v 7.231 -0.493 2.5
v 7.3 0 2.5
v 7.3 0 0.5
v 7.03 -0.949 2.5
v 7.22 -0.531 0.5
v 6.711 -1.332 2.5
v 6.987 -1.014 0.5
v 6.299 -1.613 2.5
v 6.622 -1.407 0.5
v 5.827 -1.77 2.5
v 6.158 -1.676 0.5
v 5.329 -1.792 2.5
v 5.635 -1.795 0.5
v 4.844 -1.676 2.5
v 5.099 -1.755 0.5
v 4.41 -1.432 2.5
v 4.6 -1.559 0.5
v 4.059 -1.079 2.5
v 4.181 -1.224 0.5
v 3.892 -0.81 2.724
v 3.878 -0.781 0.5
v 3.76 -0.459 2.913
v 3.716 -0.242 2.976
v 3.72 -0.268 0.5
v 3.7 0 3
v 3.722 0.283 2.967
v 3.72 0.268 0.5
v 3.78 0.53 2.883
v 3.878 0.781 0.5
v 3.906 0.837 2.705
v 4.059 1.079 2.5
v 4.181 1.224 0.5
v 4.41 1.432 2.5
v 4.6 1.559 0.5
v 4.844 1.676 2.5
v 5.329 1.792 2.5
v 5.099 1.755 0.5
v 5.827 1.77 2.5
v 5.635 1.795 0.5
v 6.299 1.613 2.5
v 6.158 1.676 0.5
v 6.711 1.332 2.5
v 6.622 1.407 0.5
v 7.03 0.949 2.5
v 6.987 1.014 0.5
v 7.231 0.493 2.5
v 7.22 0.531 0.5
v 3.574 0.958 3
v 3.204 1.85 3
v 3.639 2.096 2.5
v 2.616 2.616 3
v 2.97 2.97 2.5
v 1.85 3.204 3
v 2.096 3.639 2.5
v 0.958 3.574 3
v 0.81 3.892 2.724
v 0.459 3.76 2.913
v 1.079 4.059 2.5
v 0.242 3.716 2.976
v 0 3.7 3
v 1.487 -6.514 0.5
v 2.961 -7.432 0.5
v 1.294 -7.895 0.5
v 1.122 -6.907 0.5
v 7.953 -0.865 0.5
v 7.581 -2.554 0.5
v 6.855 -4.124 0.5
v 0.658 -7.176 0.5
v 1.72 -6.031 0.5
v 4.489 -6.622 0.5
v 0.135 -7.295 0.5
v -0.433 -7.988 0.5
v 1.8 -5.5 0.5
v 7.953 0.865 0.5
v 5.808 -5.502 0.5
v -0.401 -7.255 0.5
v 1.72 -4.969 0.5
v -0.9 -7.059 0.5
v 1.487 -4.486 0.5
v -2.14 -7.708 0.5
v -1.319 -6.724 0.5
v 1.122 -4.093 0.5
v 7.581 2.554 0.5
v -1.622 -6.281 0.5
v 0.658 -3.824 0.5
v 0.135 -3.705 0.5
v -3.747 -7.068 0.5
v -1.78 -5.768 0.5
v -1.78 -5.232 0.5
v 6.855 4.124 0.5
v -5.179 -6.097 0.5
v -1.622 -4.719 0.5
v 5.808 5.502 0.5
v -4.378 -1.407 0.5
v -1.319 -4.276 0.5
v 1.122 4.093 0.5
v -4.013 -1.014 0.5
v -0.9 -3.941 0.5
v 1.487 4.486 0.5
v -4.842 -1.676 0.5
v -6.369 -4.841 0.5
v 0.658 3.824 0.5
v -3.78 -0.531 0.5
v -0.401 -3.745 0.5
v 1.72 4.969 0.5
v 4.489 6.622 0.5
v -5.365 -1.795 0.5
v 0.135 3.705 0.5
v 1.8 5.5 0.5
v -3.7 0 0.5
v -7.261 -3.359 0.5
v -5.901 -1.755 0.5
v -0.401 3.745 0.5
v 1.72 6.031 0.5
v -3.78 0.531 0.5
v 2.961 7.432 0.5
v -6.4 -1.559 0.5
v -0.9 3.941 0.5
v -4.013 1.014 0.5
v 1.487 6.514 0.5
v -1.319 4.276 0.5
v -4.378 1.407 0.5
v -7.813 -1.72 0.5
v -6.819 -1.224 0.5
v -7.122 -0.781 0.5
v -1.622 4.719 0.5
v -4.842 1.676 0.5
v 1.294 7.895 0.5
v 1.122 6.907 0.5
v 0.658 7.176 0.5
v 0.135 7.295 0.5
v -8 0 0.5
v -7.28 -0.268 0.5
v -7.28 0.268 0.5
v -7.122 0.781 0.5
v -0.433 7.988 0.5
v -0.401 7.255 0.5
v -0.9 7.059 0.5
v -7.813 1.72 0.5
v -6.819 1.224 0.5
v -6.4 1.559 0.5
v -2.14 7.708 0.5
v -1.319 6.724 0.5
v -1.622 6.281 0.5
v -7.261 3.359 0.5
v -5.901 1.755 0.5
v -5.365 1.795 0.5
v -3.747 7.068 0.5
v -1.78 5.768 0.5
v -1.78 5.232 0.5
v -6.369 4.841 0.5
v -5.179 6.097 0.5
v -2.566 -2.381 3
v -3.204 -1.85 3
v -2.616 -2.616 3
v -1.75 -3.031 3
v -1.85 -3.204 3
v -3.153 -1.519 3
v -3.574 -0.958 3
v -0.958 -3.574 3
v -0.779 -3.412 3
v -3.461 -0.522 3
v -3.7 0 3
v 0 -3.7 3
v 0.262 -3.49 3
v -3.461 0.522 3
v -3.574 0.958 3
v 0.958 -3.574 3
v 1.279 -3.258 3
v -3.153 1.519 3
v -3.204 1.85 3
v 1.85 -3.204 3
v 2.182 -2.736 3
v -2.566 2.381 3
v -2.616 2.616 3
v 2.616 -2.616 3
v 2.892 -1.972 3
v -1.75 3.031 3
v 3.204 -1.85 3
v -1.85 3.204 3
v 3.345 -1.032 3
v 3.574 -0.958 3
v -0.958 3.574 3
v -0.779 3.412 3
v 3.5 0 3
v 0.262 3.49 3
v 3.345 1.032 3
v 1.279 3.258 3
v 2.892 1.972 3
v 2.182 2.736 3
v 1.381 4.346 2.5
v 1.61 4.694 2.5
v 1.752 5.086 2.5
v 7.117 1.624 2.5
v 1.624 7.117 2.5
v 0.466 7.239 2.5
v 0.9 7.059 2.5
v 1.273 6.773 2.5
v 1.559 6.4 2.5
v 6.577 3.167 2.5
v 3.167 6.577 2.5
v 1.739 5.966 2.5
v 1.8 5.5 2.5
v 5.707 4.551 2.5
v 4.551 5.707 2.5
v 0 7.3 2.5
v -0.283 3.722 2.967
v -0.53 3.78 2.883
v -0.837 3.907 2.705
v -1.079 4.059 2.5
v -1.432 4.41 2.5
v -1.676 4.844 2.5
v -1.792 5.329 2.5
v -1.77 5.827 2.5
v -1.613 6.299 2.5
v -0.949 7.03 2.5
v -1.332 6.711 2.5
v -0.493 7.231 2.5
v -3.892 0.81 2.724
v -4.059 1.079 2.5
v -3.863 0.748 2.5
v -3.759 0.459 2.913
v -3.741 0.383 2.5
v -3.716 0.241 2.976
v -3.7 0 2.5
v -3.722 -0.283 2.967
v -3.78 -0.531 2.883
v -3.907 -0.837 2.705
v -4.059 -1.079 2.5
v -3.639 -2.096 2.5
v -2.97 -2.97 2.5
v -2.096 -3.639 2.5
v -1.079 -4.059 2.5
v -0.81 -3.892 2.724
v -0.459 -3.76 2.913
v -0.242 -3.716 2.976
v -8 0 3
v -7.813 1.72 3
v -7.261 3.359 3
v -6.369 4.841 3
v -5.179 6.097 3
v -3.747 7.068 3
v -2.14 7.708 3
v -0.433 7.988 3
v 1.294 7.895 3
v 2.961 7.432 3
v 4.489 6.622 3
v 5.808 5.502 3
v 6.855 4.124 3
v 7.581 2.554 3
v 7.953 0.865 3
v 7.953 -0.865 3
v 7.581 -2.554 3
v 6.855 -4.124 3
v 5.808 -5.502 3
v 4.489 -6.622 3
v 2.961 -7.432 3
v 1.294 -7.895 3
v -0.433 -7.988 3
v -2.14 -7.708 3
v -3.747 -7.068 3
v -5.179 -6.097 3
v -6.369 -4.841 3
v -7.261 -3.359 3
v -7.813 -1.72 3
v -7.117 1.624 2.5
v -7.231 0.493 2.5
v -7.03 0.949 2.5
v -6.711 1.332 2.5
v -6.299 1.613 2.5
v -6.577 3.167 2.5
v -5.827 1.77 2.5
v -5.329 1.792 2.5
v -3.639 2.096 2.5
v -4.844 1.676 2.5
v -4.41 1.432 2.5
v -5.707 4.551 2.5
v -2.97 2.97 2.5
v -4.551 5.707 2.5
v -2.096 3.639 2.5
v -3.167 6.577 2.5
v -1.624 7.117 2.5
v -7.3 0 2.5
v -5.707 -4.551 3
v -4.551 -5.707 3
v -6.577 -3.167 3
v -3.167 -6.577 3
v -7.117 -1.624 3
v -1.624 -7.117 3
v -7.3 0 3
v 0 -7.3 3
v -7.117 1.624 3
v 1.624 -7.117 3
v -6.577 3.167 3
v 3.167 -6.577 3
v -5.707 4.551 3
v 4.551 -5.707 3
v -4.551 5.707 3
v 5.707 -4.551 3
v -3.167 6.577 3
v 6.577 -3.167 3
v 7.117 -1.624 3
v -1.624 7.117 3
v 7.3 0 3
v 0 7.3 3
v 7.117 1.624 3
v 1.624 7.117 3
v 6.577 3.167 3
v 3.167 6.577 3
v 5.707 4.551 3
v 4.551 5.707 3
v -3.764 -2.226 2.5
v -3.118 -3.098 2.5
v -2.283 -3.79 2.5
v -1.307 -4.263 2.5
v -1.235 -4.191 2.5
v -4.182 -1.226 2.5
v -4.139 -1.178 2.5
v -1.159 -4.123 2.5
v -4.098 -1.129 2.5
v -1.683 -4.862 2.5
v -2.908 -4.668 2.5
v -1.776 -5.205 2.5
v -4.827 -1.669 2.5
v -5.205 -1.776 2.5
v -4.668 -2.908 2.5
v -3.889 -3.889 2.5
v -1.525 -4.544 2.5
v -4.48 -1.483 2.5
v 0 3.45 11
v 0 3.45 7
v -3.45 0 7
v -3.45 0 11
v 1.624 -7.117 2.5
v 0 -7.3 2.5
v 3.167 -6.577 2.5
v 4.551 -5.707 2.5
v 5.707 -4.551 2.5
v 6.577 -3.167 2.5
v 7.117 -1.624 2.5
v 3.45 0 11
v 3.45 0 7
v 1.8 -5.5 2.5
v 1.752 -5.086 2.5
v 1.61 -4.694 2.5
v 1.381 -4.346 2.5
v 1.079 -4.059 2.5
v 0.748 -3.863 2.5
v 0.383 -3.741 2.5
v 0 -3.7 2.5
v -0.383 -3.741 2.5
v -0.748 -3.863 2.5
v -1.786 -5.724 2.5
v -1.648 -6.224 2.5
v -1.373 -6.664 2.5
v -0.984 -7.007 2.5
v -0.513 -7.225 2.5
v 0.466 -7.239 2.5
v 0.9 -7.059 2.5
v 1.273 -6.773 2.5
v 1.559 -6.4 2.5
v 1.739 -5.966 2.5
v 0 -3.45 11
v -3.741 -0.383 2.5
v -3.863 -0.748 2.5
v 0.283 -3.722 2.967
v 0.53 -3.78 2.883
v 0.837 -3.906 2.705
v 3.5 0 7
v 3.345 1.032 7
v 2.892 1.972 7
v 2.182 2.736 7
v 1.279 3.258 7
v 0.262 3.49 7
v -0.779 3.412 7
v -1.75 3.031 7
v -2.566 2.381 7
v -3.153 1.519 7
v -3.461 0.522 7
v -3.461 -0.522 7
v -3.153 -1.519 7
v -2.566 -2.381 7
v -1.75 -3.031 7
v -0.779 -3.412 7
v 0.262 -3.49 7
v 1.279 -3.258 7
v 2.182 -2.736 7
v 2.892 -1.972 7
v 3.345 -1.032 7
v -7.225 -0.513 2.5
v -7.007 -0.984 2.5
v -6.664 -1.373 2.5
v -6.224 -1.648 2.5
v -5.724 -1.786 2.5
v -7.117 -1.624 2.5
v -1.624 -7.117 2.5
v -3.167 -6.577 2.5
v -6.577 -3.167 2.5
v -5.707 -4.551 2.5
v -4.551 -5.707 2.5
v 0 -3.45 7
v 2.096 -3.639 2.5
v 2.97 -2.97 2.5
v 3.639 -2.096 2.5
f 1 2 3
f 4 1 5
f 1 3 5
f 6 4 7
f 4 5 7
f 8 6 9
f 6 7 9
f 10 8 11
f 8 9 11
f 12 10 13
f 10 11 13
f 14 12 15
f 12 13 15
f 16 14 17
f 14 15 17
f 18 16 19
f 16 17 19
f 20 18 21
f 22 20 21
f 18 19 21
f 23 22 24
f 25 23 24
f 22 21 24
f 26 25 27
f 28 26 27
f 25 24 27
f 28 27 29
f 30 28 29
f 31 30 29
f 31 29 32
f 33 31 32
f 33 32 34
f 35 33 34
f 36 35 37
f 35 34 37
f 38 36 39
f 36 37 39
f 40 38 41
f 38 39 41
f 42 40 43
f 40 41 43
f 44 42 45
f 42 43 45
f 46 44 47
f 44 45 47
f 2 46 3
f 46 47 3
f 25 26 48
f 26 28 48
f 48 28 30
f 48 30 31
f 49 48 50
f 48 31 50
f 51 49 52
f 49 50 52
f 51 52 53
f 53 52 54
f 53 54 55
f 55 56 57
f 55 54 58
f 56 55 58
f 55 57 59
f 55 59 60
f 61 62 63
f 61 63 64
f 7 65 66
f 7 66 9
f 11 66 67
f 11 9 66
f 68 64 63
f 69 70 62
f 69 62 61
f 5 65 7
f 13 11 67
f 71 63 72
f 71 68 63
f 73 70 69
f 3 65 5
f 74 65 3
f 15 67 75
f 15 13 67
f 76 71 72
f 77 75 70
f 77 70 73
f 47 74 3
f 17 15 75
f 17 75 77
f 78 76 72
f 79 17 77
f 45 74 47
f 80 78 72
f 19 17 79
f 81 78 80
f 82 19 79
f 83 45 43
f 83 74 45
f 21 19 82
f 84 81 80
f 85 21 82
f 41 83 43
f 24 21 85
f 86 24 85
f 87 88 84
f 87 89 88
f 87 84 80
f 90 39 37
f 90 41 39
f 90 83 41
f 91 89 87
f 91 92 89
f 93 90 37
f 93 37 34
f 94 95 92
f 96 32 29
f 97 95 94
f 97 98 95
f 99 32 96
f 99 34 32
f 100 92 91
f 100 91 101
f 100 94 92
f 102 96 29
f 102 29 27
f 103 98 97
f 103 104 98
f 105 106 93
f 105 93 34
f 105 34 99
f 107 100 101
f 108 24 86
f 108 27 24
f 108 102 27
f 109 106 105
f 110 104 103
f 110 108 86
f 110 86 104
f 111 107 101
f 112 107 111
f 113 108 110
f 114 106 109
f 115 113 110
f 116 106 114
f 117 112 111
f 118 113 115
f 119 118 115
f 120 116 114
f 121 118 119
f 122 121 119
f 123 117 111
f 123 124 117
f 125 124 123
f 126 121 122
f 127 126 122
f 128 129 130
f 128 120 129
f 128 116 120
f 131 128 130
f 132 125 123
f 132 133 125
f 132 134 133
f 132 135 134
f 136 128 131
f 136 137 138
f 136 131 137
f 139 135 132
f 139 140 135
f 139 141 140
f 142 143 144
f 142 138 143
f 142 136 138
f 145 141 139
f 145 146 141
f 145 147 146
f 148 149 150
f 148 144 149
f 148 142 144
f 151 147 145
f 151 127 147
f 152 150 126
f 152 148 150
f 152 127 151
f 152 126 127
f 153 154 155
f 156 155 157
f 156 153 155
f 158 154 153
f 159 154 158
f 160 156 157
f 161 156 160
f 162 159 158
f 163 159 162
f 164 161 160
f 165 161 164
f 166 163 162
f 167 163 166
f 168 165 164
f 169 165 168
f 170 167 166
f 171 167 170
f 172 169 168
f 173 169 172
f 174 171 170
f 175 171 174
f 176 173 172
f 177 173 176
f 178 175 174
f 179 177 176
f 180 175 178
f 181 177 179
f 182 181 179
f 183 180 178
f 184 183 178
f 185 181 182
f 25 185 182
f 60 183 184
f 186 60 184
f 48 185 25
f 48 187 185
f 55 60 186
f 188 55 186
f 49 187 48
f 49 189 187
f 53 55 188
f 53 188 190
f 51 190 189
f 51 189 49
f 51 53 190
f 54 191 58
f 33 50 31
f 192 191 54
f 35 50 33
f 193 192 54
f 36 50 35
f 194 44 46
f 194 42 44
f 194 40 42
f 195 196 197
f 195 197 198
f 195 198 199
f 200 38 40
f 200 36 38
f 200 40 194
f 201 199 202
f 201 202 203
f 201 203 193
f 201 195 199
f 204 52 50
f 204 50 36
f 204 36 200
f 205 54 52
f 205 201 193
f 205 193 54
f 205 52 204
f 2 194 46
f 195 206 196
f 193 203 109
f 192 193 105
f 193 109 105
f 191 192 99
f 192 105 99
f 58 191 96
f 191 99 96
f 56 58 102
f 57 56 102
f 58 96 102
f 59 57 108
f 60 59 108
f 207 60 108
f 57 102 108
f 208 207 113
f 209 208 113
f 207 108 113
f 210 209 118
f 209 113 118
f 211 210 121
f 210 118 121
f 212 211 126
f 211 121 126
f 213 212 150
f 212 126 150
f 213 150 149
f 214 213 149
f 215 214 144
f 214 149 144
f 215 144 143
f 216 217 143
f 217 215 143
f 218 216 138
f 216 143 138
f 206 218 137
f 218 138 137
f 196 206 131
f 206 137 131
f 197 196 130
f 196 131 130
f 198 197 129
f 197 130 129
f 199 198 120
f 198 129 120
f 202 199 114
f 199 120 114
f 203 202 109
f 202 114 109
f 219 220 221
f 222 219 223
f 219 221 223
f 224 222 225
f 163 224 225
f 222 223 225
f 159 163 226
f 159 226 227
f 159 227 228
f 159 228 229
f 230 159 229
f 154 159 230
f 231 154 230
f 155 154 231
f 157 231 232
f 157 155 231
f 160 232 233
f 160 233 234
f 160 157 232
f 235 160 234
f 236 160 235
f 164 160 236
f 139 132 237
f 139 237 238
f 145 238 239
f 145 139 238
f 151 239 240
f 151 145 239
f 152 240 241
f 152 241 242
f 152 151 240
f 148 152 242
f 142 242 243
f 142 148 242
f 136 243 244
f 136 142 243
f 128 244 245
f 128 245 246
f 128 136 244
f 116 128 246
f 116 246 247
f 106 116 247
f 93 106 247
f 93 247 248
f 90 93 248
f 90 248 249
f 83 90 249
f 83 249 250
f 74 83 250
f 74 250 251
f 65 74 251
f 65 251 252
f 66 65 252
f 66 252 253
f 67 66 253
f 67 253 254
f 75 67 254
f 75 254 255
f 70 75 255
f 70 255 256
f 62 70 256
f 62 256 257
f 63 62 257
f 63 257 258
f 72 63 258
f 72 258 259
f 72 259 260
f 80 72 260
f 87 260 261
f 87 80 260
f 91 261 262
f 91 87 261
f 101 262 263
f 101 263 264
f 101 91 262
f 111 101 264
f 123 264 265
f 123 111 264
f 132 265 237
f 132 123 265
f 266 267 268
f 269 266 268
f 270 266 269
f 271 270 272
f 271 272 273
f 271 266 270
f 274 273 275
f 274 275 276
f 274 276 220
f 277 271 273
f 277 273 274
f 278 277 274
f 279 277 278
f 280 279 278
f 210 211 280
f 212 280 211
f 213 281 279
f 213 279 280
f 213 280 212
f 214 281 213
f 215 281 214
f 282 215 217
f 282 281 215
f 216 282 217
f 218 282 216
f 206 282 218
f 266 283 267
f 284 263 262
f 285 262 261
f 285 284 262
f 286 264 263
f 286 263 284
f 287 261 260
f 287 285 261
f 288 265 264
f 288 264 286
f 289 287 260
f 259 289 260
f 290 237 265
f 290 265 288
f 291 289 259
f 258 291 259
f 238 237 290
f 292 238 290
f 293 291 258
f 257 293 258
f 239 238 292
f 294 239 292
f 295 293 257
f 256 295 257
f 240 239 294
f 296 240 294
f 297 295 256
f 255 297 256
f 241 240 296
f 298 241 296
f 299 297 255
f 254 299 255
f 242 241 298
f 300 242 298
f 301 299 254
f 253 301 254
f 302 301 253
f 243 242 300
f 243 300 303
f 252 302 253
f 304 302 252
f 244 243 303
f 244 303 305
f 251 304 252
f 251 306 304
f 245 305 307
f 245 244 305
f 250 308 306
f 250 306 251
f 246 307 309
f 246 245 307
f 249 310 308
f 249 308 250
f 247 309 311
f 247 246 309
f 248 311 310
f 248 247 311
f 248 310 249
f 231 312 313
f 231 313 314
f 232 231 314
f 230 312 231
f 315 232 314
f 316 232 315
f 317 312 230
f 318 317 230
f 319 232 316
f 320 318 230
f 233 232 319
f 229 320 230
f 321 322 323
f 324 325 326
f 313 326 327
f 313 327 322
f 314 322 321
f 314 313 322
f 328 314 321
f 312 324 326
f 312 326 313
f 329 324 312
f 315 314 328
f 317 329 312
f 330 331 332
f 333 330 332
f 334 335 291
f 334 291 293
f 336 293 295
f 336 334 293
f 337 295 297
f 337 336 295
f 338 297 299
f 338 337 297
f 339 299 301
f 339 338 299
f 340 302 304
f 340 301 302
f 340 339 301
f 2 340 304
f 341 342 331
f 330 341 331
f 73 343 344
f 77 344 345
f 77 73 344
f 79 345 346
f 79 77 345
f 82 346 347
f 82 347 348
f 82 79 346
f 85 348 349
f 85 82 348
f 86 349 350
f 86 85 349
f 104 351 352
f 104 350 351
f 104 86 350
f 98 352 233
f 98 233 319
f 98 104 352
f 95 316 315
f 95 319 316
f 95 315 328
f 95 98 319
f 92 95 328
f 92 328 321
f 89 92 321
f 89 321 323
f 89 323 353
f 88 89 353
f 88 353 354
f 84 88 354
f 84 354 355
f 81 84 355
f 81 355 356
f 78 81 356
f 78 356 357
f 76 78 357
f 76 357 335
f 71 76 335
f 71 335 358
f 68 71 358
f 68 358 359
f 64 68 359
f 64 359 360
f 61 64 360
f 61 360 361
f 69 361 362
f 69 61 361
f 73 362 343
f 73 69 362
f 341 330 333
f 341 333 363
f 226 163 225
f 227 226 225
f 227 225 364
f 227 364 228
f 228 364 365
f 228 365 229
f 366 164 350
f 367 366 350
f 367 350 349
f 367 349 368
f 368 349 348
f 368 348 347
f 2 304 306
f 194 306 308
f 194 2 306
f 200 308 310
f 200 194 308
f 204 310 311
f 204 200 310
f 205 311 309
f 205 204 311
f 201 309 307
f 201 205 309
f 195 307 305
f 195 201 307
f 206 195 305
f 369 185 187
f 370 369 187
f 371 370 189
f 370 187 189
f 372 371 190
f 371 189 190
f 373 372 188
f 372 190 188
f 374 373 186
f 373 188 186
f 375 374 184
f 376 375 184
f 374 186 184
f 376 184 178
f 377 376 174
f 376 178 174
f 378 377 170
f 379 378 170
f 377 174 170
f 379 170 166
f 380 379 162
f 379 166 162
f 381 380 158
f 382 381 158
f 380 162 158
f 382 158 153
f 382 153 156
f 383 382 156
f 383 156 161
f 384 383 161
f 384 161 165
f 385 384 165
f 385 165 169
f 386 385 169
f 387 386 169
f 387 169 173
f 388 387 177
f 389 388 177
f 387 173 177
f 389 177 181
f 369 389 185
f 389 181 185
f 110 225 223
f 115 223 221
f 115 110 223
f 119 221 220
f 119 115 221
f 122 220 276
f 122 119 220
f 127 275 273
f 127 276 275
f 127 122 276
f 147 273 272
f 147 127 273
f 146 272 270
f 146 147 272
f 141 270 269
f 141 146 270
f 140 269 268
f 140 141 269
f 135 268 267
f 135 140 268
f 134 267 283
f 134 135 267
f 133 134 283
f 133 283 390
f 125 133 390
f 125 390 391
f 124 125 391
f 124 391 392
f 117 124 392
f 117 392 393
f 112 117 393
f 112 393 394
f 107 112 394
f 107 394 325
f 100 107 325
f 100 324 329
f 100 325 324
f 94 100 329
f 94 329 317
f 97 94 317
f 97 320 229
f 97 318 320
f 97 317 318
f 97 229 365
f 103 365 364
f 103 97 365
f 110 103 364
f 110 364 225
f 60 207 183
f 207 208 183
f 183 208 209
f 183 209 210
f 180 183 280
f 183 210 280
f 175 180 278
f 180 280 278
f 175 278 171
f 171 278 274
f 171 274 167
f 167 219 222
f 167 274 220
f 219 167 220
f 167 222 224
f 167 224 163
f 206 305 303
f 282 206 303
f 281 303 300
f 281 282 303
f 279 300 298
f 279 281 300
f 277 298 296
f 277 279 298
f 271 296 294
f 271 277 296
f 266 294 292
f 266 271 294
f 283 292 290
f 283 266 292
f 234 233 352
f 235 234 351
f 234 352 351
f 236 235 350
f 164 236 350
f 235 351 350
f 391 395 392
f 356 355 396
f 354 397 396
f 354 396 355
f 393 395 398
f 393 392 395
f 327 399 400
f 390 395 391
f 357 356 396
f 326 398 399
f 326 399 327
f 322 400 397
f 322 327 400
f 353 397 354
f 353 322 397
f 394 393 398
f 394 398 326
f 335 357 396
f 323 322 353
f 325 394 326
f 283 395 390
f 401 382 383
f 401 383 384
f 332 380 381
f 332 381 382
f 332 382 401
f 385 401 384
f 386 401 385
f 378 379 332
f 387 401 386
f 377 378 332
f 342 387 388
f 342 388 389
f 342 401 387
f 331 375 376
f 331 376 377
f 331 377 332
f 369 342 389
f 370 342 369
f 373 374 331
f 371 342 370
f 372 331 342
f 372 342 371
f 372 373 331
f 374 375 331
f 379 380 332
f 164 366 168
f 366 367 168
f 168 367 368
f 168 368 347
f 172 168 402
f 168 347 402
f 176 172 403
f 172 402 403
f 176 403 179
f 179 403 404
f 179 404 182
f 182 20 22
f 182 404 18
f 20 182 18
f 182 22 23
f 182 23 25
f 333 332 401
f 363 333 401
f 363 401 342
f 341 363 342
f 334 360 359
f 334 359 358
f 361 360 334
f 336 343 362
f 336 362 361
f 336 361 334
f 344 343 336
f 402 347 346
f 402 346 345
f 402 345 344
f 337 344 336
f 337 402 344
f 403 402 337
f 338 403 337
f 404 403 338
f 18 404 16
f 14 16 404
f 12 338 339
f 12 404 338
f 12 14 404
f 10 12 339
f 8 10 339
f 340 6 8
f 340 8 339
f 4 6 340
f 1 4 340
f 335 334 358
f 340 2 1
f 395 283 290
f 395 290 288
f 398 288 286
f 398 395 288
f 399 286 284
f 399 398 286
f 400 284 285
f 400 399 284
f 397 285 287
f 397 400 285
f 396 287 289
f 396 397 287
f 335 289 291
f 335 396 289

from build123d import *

# Parameters (mm, degrees)
SKETCH_1_R           = 9
SKETCH_1_R_2         = 1.8
EXTRUDE_1_DEPTH      = 3
SKETCH_2_R           = 2.5
EXTRUDE_2_DEPTH      = 5
SKETCH_3_R           = 3
EXTRUDE_3_DEPTH      = 1
EXTRUDE_4_DEPTH      = 1
EXTRUDE_4_DEPTH_BACK = 1
SKETCH_4_R           = 0.75
SKETCH_5_R           = 11.774758228
CUT_EXTRUDE_1_DEPTH  = 10
EXTRUDE_5_DEPTH      = 2
CUT_EXTRUDE_2_DEPTH  = 2
SKETCH_8_R           = 14.855083979
SKETCH_8_R_2         = 8
CUT_EXTRUDE_3_DEPTH  = 10
CUT_EXTRUDE_START    = -0.5
SKETCH_9_R           = 4.256493188
SKETCH_9_R_2         = 2.5
CUT_EXTRUDE_4_DEPTH  = 0.5
SKETCH_10_R          = 3.45
EXTRUDE_6_DEPTH      = 3.5
SKETCH_11_R          = 3.7
EXTRUDE_7_DEPTH      = 3.5
CHAMFER_1_SIZE       = 0.5
EXTRUDE_8_DEPTH      = 4
SKETCH_13_R          = 4.2
SKETCH_13_R_2        = 3.45
CUT_EXTRUDE_5_DEPTH  = 3
SKETCH_14_R          = 6
SKETCH_14_R_2        = 3.7
CUT_EXTRUDE_6_DEPTH  = 0.5
CHAMFER_2_SIZE       = 0.5
CHAMFER_3_SIZE       = 0.5
SKETCH_15_R          = 3.5
EXTRUDE_9_DEPTH      = 4
SKETCH_16_R          = 7.3
SKETCH_16_R_2        = 4.506279258
CUT_EXTRUDE_7_DEPTH  = 3
SKETCH_19_R          = 10.067308749
CUT_EXTRUDE_9_DEPTH  = 0.5


with BuildPart() as part:
    # 草图1 → 凸台-拉伸1 (new body)
    with BuildSketch(Plane.XY):
        Circle(SKETCH_1_R)
        with Locations((0, 5.5)):
            Circle(SKETCH_1_R_2, mode=Mode.SUBTRACT)
        with Locations((5.5, 0)):
            Circle(SKETCH_1_R_2, mode=Mode.SUBTRACT)
        with Locations((0, -5.5)):
            Circle(SKETCH_1_R_2, mode=Mode.SUBTRACT)
        with Locations((-5.5, 0)):
            Circle(SKETCH_1_R_2, mode=Mode.SUBTRACT)
    extrude(amount=EXTRUDE_1_DEPTH)

    # 草图2 → 凸台-拉伸2 (add)
    with BuildSketch(Plane.XY.offset(3)):
        Circle(SKETCH_2_R)
    extrude(amount=EXTRUDE_2_DEPTH)

    # 草图3 → 凸台-拉伸3 (add)
    with BuildSketch(Plane.XY.offset(3)):
        Circle(SKETCH_3_R)
    extrude(amount=EXTRUDE_3_DEPTH)

    # 草图4 → 凸台-拉伸4 (add, two sides: drawn at the far end of the back side and taken through both)
    # profile 1 of 2: a face of its own
    with BuildSketch(Plane.XY.offset(8).offset(-EXTRUDE_4_DEPTH_BACK)):
        with BuildLine():
            Line((2.485541606, 0.268482638), (1.988740974, 4.867732145))
            ThreePointArc((1.988740974, 4.867732145), (-0.00103483, 6.652941663), (-1.988404355, 4.865053763))
            Line((-1.988404355, 4.865053763), (-1.989024096, 4.859160292))
            Line((-1.989024096, 4.859160292), (-2.445314485, 0.520035641))
            ThreePointArc((-2.445314485, 0.520035641), (0.12737458, 2.496753035), (2.485541606, 0.268482638))
        make_face()
        with Locations((0.000312053, 4.652946506)):
            Circle(SKETCH_4_R, mode=Mode.SUBTRACT)
    # profile 2 of 2: a face of its own
    with BuildSketch(Plane.XY.offset(8).offset(-EXTRUDE_4_DEPTH_BACK)):
        with BuildLine():
            ThreePointArc((2.5, 0), (2.496382785, 0.134435832), (2.485541606, 0.268482638))
            ThreePointArc((2.485541606, 0.268482638), (0.12737458, 2.496753035), (-2.445314485, 0.520035641))
            Line((-2.445314485, 0.520035641), (-2.5, 0))
            ThreePointArc((-2.5, 0), (0, -2.5), (2.5, 0))
        make_face()
    extrude(amount=EXTRUDE_4_DEPTH + EXTRUDE_4_DEPTH_BACK)

    # 草图5 → 切除-拉伸1 (cut)
    with BuildSketch(Plane(origin=(0, 0, 7), x_dir=(-1, 0, 0), z_dir=(0, 0, -1))):
        Circle(SKETCH_5_R)
        Polygon((0, 2.481609408), (2.5, 0), (0, -2.5), (-2.5, 0), align=None, mode=Mode.SUBTRACT)
    extrude(amount=-CUT_EXTRUDE_1_DEPTH, mode=Mode.SUBTRACT)

    # 草图6 → 凸台-拉伸5 (add)
    with BuildSketch(Plane.XY.offset(9)):
        Polygon((0, 2.5), (-2.5, 0), (0, -2.5), (2.5, 0), align=None)
    extrude(amount=EXTRUDE_5_DEPTH)

    # 草图7 → 切除-拉伸2 (cut)
    with BuildSketch(Plane(origin=(0, 0, 9), x_dir=(-1, 0, 0), z_dir=(0, 0, -1))):
        Polygon((0, 2.481609408), (-2.5, 0), (-8.257651415, 6.64470805), (8.324868768, 1.809009791), (0.901487765, -7.246606168), (2.5, 0), align=None)
    extrude(amount=-CUT_EXTRUDE_2_DEPTH, mode=Mode.SUBTRACT)

    # 草图8 → 切除-拉伸3 (cut)
    with BuildSketch(Plane(origin=(0, 0, 0), x_dir=(-1, 0, 0), z_dir=(0, 0, -1))):
        with Locations((-0.238627472, 0)):
            Circle(SKETCH_8_R)
        Circle(SKETCH_8_R_2, mode=Mode.SUBTRACT)
    extrude(amount=-CUT_EXTRUDE_3_DEPTH, mode=Mode.SUBTRACT)

    # 草图9 → 切除-拉伸4 (cut)
    with BuildSketch(Plane.XY.offset(4).offset(CUT_EXTRUDE_START)):
        with Locations((0, 0.120232911)):
            Circle(SKETCH_9_R)
        Circle(SKETCH_9_R_2, mode=Mode.SUBTRACT)
    extrude(amount=CUT_EXTRUDE_4_DEPTH, mode=Mode.SUBTRACT)

    # 草图10 → 凸台-拉伸6 (add)
    with BuildSketch(Plane.XY.offset(3.5)):
        Circle(SKETCH_10_R)
    extrude(amount=EXTRUDE_6_DEPTH)

    # 草图11 → 凸台-拉伸7 (add)
    with BuildSketch(Plane(origin=(0, 0, 3.5), x_dir=(-1, 0, 0), z_dir=(0, 0, -1))):
        with Locations(Location((0, 0, 0), (0, 0, 180.000240938))):
            Circle(SKETCH_11_R)
    extrude(amount=EXTRUDE_7_DEPTH)

    # 倒角1
    # the kernel refuses this chamfer: 0.5 mm, written as the material it adds along each edge
    with BuildSketch(Plane(origin=(0, 0, 3), x_dir=(2.429298144255796e-07, -0.9999999999999705, 0), z_dir=(-0.9999999999999705, -2.429298144255796e-07, 0))) as chamfer_1_piece_1_section:
        Polygon((3.7 + CHAMFER_1_SIZE, 0), (3.7, CHAMFER_1_SIZE), (3.7, 0), align=None)
    chamfer_1_piece_1 = revolve(axis=Axis((0, 0, 3), (0, 0, 1)), revolution_arc=89.999745143, mode=Mode.PRIVATE)
    chamfer_1_piece_1 = chamfer_1_piece_1 - Plane(origin=(5.5, 0, 3.243994097), x_dir=(1, 0, 0), z_dir=(0, 0, -1)) * Cylinder(1.8, 17, mode=Mode.PRIVATE)
    chamfer_1_piece_1 = chamfer_1_piece_1 - Plane(origin=(0, -5.5, 3.243994097), x_dir=(1, 0, 0), z_dir=(0, 0, -1)) * Cylinder(1.8, 17, mode=Mode.PRIVATE)
    add(chamfer_1_piece_1)
    with BuildSketch(Plane(origin=(0, 0, 3), x_dir=(0.9999999999911583, -4.205161392743551e-06, 0), z_dir=(-4.205161392743551e-06, -0.9999999999911583, 0))) as chamfer_1_piece_2_section:
        Polygon((3.7 + CHAMFER_1_SIZE, 0), (3.7, CHAMFER_1_SIZE), (3.7, 0), align=None)
    chamfer_1_piece_2 = revolve(axis=Axis((0, 0, 3), (0, 0, 1)), revolution_arc=90.000240938, mode=Mode.PRIVATE)
    chamfer_1_piece_2 = chamfer_1_piece_2 - Plane(origin=(0, 5.5, 3.243994362), x_dir=(1, 0, 0), z_dir=(0, 0, -1)) * Cylinder(1.8, 17, mode=Mode.PRIVATE)
    chamfer_1_piece_2 = chamfer_1_piece_2 - Plane(origin=(5.5, 0, 3.243994362), x_dir=(1, 0, 0), z_dir=(0, 0, -1)) * Cylinder(1.8, 17, mode=Mode.PRIVATE)
    add(chamfer_1_piece_2)
    with BuildSketch(Plane(origin=(0, 0, 3), x_dir=(-1, 0, 0), z_dir=(0, 1, 0))) as chamfer_1_piece_3_section:
        Polygon((3.7 + CHAMFER_1_SIZE, 0), (3.7, CHAMFER_1_SIZE), (3.7, 0), align=None)
    chamfer_1_piece_3 = revolve(axis=Axis((0, 0, 3), (0, 0, 1)), revolution_arc=90.000013919, mode=Mode.PRIVATE)
    chamfer_1_piece_3 = chamfer_1_piece_3 - Plane(origin=(-5.5, 0, 3.24399412), x_dir=(1, 0, 0), z_dir=(0, 0, -1)) * Cylinder(1.8, 17, mode=Mode.PRIVATE)
    chamfer_1_piece_3 = chamfer_1_piece_3 - Plane(origin=(0, -5.5, 3.24399412), x_dir=(1, 0, 0), z_dir=(0, 0, -1)) * Cylinder(1.8, 17, mode=Mode.PRIVATE)
    add(chamfer_1_piece_3)
    with BuildSketch(Plane(origin=(0, 0, 3), x_dir=(0, 1, 0), z_dir=(1, 0, 0))) as chamfer_1_piece_4_section:
        Polygon((3.7 + CHAMFER_1_SIZE, 0), (3.7, CHAMFER_1_SIZE), (3.7, 0), align=None)
    chamfer_1_piece_4 = revolve(axis=Axis((0, 0, 3), (0, 0, 1)), revolution_arc=90, mode=Mode.PRIVATE)
    chamfer_1_piece_4 = chamfer_1_piece_4 - Plane(origin=(0, 5.5, 3.243994109), x_dir=(1, 0, 0), z_dir=(0, 0, -1)) * Cylinder(1.8, 17, mode=Mode.PRIVATE)
    chamfer_1_piece_4 = chamfer_1_piece_4 - Plane(origin=(-5.5, 0, 3.243994109), x_dir=(1, 0, 0), z_dir=(0, 0, -1)) * Cylinder(1.8, 17, mode=Mode.PRIVATE)
    add(chamfer_1_piece_4)

    # 草图12 → 凸台-拉伸8 (add)
    with BuildSketch(Plane.XY.offset(7)):
        Polygon((0, 3.45), (-3.45, 0), (0, -3.45), (3.45, 0), align=None)
    extrude(amount=EXTRUDE_8_DEPTH)

    # 草图13 → 切除-拉伸5 (cut)
    with BuildSketch(Plane.XY.offset(3)):
        Circle(SKETCH_13_R)
        Circle(SKETCH_13_R_2, mode=Mode.SUBTRACT)
    extrude(amount=CUT_EXTRUDE_5_DEPTH, mode=Mode.SUBTRACT)

    # 草图14 → 切除-拉伸6 (cut)
    with BuildSketch(Plane.XY.offset(3)):
        Circle(SKETCH_14_R)
        Circle(SKETCH_14_R_2, mode=Mode.SUBTRACT)
    extrude(amount=-CUT_EXTRUDE_6_DEPTH, mode=Mode.SUBTRACT)

    # 倒角2
    # the kernel refuses this chamfer: 0.5 mm, written as the material it adds along each edge
    with BuildSketch(Plane(origin=(0, 0, 2.5), x_dir=(2.6572576900546526e-07, 0.9999999999999647, 0), z_dir=(0.9999999999999647, -2.6572576900546526e-07, 0))) as chamfer_2_piece_1_section:
        Polygon((3.7, CHAMFER_2_SIZE), (3.7 + CHAMFER_2_SIZE, 0), (3.7, 0), align=None)
    chamfer_2_piece_1 = revolve(axis=Axis((0, 0, 2.5), (0, 0, 1)), revolution_arc=90.000015225, mode=Mode.PRIVATE)
    chamfer_2_piece_1 = chamfer_2_piece_1 - Plane(origin=(-5.5, 0, 2.743994122), x_dir=(1, 0, 0), z_dir=(0, 0, -1)) * Cylinder(1.8, 17, mode=Mode.PRIVATE)
    chamfer_2_piece_1 = chamfer_2_piece_1 - Plane(origin=(0, 5.5, 2.743994122), x_dir=(1, 0, 0), z_dir=(0, 0, -1)) * Cylinder(1.8, 17, mode=Mode.PRIVATE)
    add(chamfer_2_piece_1)
    with BuildSketch(Plane(origin=(0, 0, 2.5), x_dir=(1, 0, 0), z_dir=(0, -1, 0))) as chamfer_2_piece_2_section:
        Polygon((3.7, CHAMFER_2_SIZE), (3.7 + CHAMFER_2_SIZE, 0), (3.7, 0), align=None)
    chamfer_2_piece_2 = revolve(axis=Axis((0, 0, 2.5), (0, 0, 1)), revolution_arc=89.999984775, mode=Mode.PRIVATE)
    chamfer_2_piece_2 = chamfer_2_piece_2 - Plane(origin=(0, 5.5, 2.743994101), x_dir=(1, 0, 0), z_dir=(0, 0, -1)) * Cylinder(1.8, 17, mode=Mode.PRIVATE)
    chamfer_2_piece_2 = chamfer_2_piece_2 - Plane(origin=(5.5, 0, 2.743994101), x_dir=(1, 0, 0), z_dir=(0, 0, -1)) * Cylinder(1.8, 17, mode=Mode.PRIVATE)
    add(chamfer_2_piece_2)
    with BuildSketch(Plane(origin=(0, 0, 2.5), x_dir=(-1, 0, 0), z_dir=(0, 1, 0))) as chamfer_2_piece_3_section:
        Polygon((3.7 + CHAMFER_2_SIZE, 0), (3.7, CHAMFER_2_SIZE), (3.7, 0), align=None)
    chamfer_2_piece_3 = revolve(axis=Axis((0, 0, 2.5), (0, 0, 1)), revolution_arc=90.000015225, mode=Mode.PRIVATE)
    chamfer_2_piece_3 = chamfer_2_piece_3 - Plane(origin=(0, -5.5, 2.743994115), x_dir=(1, 0, 0), z_dir=(0, 0, -1)) * Cylinder(1.8, 17, mode=Mode.PRIVATE)
    chamfer_2_piece_3 = chamfer_2_piece_3 - Plane(origin=(-5.5, 0, 2.743994115), x_dir=(1, 0, 0), z_dir=(0, 0, -1)) * Cylinder(1.8, 17, mode=Mode.PRIVATE)
    add(chamfer_2_piece_3)
    with BuildSketch(Plane(origin=(0, 0, 2.5), x_dir=(2.657257683164467e-07, -0.9999999999999647, 0), z_dir=(-0.9999999999999647, -2.657257683164467e-07, 0))) as chamfer_2_piece_4_section:
        Polygon((3.7, CHAMFER_2_SIZE), (3.7 + CHAMFER_2_SIZE, 0), (3.7, 0), align=None)
    chamfer_2_piece_4 = revolve(axis=Axis((0, 0, 2.5), (0, 0, 1)), revolution_arc=89.999984775, mode=Mode.PRIVATE)
    chamfer_2_piece_4 = chamfer_2_piece_4 - Plane(origin=(0, -5.5, 2.743994101), x_dir=(1, 0, 0), z_dir=(0, 0, -1)) * Cylinder(1.8, 17, mode=Mode.PRIVATE)
    chamfer_2_piece_4 = chamfer_2_piece_4 - Plane(origin=(5.5, 0, 2.743994101), x_dir=(1, 0, 0), z_dir=(0, 0, -1)) * Cylinder(1.8, 17, mode=Mode.PRIVATE)
    add(chamfer_2_piece_4)

    # 倒角3
    # the kernel refuses this chamfer: 0.5 mm, written as the material it adds along each edge
    with BuildSketch(Plane(origin=(0, 0, 2.5), x_dir=(0.08770420194381934, -0.9961465619884445, 0), z_dir=(-0.9961465619884445, -0.08770420194381934, 0))) as chamfer_3_piece_1_section:
        Polygon((6 - CHAMFER_3_SIZE, 0), (6, CHAMFER_3_SIZE), (6, 0), align=None)
    chamfer_3_piece_1 = revolve(axis=Axis((0, 0, 2.5), (0, 0, 1)), revolution_arc=79.936909611, mode=Mode.PRIVATE)
    chamfer_3_piece_1 = chamfer_3_piece_1 - Plane(origin=(0, -5.5, 2.736482642), x_dir=(1, 0, 0), z_dir=(0, 0, -1)) * Cylinder(1.8, 25, mode=Mode.PRIVATE)
    chamfer_3_piece_1 = chamfer_3_piece_1 - Plane(origin=(5.5, 0, 2.736482642), x_dir=(1, 0, 0), z_dir=(0, 0, -1)) * Cylinder(1.8, 25, mode=Mode.PRIVATE)
    chamfer_3_piece_1 = split(chamfer_3_piece_1, bisect_by=Plane(origin=(4.065422208, -4.065422207, 3), z_dir=(0, 0, -1)), keep=Keep.TOP, mode=Mode.PRIVATE)
    add(chamfer_3_piece_1)
    with BuildSketch(Plane(origin=(0, 0, 2.5), x_dir=(-0.9961465619884445, -0.08770420194381941, 0), z_dir=(-0.08770420194381941, 0.9961465619884445, 0))) as chamfer_3_piece_2_section:
        Polygon((6 - CHAMFER_3_SIZE, 0), (6, CHAMFER_3_SIZE), (6, 0), align=None)
    chamfer_3_piece_2 = revolve(axis=Axis((0, 0, 2.5), (0, 0, 1)), revolution_arc=79.936909611, mode=Mode.PRIVATE)
    chamfer_3_piece_2 = chamfer_3_piece_2 - Plane(origin=(0, -5.5, 2.736482642), x_dir=(1, 0, 0), z_dir=(0, 0, -1)) * Cylinder(1.8, 25, mode=Mode.PRIVATE)
    chamfer_3_piece_2 = chamfer_3_piece_2 - Plane(origin=(-5.5, 0, 2.736482642), x_dir=(1, 0, 0), z_dir=(0, 0, -1)) * Cylinder(1.8, 25, mode=Mode.PRIVATE)
    chamfer_3_piece_2 = split(chamfer_3_piece_2, bisect_by=Plane(origin=(-4.065422207, -4.065422207, 3), z_dir=(0, 0, -1)), keep=Keep.TOP, mode=Mode.PRIVATE)
    add(chamfer_3_piece_2)
    with BuildSketch(Plane(origin=(0, 0, 2.5), x_dir=(0.9961465619884445, 0.08770420194381914, 0), z_dir=(0.08770420194381914, -0.9961465619884445, 0))) as chamfer_3_piece_3_section:
        Polygon((6, CHAMFER_3_SIZE), (6 - CHAMFER_3_SIZE, 0), (6, 0), align=None)
    chamfer_3_piece_3 = revolve(axis=Axis((0, 0, 2.5), (0, 0, 1)), revolution_arc=79.936909611, mode=Mode.PRIVATE)
    chamfer_3_piece_3 = chamfer_3_piece_3 - Plane(origin=(5.5, 0, 2.736482642), x_dir=(1, 0, 0), z_dir=(0, 0, -1)) * Cylinder(1.8, 24, mode=Mode.PRIVATE)
    chamfer_3_piece_3 = split(chamfer_3_piece_3, bisect_by=Plane(origin=(4.065422208, 4.065422207, 3), z_dir=(0, 0, -1)), keep=Keep.TOP, mode=Mode.PRIVATE)
    chamfer_3_piece_3 = chamfer_3_piece_3 - Plane(origin=(0, 5.5, 2.736482642), x_dir=(1, 0, 0), z_dir=(0, 0, -1)) * Cylinder(1.8, 24, mode=Mode.PRIVATE)
    add(chamfer_3_piece_3)
    with BuildSketch(Plane(origin=(0, 0, 2.5), x_dir=(-0.08770420194381902, 0.9961465619884445, 0), z_dir=(0.9961465619884445, 0.08770420194381902, 0))) as chamfer_3_piece_4_section:
        Polygon((6 - CHAMFER_3_SIZE, 0), (6, CHAMFER_3_SIZE), (6, 0), align=None)
    chamfer_3_piece_4 = revolve(axis=Axis((0, 0, 2.5), (0, 0, 1)), revolution_arc=79.936909611, mode=Mode.PRIVATE)
    chamfer_3_piece_4 = split(chamfer_3_piece_4, bisect_by=Plane(origin=(-4.065422207, 4.065422207, 3), z_dir=(0, 0, -1)), keep=Keep.TOP, mode=Mode.PRIVATE)
    chamfer_3_piece_4 = chamfer_3_piece_4 - Plane(origin=(0, 5.5, 2.736482642), x_dir=(1, 0, 0), z_dir=(0, 0, -1)) * Cylinder(1.8, 25, mode=Mode.PRIVATE)
    chamfer_3_piece_4 = chamfer_3_piece_4 - Plane(origin=(-5.5, 0, 2.736482642), x_dir=(1, 0, 0), z_dir=(0, 0, -1)) * Cylinder(1.8, 25, mode=Mode.PRIVATE)
    add(chamfer_3_piece_4)

    # 草图15 → 凸台-拉伸9 (add)
    with BuildSketch(Plane.XY.offset(3)):
        Circle(SKETCH_15_R)
    extrude(amount=EXTRUDE_9_DEPTH)

    # 草图16 → 切除-拉伸7 (cut)
    with BuildSketch(Plane.XY.offset(2.5)):
        Circle(SKETCH_16_R)
        with Locations((0.154292063, 0)):
            Circle(SKETCH_16_R_2, mode=Mode.SUBTRACT)
    extrude(amount=CUT_EXTRUDE_7_DEPTH, mode=Mode.SUBTRACT)

    # 草图19 → 切除-拉伸9 (cut)
    with BuildSketch(Plane(origin=(0, 0, 0), x_dir=(-1, 0, 0), z_dir=(0, 0, -1))):
        Circle(SKETCH_19_R)
    extrude(amount=-CUT_EXTRUDE_9_DEPTH, mode=Mode.SUBTRACT)


solid = part.part
